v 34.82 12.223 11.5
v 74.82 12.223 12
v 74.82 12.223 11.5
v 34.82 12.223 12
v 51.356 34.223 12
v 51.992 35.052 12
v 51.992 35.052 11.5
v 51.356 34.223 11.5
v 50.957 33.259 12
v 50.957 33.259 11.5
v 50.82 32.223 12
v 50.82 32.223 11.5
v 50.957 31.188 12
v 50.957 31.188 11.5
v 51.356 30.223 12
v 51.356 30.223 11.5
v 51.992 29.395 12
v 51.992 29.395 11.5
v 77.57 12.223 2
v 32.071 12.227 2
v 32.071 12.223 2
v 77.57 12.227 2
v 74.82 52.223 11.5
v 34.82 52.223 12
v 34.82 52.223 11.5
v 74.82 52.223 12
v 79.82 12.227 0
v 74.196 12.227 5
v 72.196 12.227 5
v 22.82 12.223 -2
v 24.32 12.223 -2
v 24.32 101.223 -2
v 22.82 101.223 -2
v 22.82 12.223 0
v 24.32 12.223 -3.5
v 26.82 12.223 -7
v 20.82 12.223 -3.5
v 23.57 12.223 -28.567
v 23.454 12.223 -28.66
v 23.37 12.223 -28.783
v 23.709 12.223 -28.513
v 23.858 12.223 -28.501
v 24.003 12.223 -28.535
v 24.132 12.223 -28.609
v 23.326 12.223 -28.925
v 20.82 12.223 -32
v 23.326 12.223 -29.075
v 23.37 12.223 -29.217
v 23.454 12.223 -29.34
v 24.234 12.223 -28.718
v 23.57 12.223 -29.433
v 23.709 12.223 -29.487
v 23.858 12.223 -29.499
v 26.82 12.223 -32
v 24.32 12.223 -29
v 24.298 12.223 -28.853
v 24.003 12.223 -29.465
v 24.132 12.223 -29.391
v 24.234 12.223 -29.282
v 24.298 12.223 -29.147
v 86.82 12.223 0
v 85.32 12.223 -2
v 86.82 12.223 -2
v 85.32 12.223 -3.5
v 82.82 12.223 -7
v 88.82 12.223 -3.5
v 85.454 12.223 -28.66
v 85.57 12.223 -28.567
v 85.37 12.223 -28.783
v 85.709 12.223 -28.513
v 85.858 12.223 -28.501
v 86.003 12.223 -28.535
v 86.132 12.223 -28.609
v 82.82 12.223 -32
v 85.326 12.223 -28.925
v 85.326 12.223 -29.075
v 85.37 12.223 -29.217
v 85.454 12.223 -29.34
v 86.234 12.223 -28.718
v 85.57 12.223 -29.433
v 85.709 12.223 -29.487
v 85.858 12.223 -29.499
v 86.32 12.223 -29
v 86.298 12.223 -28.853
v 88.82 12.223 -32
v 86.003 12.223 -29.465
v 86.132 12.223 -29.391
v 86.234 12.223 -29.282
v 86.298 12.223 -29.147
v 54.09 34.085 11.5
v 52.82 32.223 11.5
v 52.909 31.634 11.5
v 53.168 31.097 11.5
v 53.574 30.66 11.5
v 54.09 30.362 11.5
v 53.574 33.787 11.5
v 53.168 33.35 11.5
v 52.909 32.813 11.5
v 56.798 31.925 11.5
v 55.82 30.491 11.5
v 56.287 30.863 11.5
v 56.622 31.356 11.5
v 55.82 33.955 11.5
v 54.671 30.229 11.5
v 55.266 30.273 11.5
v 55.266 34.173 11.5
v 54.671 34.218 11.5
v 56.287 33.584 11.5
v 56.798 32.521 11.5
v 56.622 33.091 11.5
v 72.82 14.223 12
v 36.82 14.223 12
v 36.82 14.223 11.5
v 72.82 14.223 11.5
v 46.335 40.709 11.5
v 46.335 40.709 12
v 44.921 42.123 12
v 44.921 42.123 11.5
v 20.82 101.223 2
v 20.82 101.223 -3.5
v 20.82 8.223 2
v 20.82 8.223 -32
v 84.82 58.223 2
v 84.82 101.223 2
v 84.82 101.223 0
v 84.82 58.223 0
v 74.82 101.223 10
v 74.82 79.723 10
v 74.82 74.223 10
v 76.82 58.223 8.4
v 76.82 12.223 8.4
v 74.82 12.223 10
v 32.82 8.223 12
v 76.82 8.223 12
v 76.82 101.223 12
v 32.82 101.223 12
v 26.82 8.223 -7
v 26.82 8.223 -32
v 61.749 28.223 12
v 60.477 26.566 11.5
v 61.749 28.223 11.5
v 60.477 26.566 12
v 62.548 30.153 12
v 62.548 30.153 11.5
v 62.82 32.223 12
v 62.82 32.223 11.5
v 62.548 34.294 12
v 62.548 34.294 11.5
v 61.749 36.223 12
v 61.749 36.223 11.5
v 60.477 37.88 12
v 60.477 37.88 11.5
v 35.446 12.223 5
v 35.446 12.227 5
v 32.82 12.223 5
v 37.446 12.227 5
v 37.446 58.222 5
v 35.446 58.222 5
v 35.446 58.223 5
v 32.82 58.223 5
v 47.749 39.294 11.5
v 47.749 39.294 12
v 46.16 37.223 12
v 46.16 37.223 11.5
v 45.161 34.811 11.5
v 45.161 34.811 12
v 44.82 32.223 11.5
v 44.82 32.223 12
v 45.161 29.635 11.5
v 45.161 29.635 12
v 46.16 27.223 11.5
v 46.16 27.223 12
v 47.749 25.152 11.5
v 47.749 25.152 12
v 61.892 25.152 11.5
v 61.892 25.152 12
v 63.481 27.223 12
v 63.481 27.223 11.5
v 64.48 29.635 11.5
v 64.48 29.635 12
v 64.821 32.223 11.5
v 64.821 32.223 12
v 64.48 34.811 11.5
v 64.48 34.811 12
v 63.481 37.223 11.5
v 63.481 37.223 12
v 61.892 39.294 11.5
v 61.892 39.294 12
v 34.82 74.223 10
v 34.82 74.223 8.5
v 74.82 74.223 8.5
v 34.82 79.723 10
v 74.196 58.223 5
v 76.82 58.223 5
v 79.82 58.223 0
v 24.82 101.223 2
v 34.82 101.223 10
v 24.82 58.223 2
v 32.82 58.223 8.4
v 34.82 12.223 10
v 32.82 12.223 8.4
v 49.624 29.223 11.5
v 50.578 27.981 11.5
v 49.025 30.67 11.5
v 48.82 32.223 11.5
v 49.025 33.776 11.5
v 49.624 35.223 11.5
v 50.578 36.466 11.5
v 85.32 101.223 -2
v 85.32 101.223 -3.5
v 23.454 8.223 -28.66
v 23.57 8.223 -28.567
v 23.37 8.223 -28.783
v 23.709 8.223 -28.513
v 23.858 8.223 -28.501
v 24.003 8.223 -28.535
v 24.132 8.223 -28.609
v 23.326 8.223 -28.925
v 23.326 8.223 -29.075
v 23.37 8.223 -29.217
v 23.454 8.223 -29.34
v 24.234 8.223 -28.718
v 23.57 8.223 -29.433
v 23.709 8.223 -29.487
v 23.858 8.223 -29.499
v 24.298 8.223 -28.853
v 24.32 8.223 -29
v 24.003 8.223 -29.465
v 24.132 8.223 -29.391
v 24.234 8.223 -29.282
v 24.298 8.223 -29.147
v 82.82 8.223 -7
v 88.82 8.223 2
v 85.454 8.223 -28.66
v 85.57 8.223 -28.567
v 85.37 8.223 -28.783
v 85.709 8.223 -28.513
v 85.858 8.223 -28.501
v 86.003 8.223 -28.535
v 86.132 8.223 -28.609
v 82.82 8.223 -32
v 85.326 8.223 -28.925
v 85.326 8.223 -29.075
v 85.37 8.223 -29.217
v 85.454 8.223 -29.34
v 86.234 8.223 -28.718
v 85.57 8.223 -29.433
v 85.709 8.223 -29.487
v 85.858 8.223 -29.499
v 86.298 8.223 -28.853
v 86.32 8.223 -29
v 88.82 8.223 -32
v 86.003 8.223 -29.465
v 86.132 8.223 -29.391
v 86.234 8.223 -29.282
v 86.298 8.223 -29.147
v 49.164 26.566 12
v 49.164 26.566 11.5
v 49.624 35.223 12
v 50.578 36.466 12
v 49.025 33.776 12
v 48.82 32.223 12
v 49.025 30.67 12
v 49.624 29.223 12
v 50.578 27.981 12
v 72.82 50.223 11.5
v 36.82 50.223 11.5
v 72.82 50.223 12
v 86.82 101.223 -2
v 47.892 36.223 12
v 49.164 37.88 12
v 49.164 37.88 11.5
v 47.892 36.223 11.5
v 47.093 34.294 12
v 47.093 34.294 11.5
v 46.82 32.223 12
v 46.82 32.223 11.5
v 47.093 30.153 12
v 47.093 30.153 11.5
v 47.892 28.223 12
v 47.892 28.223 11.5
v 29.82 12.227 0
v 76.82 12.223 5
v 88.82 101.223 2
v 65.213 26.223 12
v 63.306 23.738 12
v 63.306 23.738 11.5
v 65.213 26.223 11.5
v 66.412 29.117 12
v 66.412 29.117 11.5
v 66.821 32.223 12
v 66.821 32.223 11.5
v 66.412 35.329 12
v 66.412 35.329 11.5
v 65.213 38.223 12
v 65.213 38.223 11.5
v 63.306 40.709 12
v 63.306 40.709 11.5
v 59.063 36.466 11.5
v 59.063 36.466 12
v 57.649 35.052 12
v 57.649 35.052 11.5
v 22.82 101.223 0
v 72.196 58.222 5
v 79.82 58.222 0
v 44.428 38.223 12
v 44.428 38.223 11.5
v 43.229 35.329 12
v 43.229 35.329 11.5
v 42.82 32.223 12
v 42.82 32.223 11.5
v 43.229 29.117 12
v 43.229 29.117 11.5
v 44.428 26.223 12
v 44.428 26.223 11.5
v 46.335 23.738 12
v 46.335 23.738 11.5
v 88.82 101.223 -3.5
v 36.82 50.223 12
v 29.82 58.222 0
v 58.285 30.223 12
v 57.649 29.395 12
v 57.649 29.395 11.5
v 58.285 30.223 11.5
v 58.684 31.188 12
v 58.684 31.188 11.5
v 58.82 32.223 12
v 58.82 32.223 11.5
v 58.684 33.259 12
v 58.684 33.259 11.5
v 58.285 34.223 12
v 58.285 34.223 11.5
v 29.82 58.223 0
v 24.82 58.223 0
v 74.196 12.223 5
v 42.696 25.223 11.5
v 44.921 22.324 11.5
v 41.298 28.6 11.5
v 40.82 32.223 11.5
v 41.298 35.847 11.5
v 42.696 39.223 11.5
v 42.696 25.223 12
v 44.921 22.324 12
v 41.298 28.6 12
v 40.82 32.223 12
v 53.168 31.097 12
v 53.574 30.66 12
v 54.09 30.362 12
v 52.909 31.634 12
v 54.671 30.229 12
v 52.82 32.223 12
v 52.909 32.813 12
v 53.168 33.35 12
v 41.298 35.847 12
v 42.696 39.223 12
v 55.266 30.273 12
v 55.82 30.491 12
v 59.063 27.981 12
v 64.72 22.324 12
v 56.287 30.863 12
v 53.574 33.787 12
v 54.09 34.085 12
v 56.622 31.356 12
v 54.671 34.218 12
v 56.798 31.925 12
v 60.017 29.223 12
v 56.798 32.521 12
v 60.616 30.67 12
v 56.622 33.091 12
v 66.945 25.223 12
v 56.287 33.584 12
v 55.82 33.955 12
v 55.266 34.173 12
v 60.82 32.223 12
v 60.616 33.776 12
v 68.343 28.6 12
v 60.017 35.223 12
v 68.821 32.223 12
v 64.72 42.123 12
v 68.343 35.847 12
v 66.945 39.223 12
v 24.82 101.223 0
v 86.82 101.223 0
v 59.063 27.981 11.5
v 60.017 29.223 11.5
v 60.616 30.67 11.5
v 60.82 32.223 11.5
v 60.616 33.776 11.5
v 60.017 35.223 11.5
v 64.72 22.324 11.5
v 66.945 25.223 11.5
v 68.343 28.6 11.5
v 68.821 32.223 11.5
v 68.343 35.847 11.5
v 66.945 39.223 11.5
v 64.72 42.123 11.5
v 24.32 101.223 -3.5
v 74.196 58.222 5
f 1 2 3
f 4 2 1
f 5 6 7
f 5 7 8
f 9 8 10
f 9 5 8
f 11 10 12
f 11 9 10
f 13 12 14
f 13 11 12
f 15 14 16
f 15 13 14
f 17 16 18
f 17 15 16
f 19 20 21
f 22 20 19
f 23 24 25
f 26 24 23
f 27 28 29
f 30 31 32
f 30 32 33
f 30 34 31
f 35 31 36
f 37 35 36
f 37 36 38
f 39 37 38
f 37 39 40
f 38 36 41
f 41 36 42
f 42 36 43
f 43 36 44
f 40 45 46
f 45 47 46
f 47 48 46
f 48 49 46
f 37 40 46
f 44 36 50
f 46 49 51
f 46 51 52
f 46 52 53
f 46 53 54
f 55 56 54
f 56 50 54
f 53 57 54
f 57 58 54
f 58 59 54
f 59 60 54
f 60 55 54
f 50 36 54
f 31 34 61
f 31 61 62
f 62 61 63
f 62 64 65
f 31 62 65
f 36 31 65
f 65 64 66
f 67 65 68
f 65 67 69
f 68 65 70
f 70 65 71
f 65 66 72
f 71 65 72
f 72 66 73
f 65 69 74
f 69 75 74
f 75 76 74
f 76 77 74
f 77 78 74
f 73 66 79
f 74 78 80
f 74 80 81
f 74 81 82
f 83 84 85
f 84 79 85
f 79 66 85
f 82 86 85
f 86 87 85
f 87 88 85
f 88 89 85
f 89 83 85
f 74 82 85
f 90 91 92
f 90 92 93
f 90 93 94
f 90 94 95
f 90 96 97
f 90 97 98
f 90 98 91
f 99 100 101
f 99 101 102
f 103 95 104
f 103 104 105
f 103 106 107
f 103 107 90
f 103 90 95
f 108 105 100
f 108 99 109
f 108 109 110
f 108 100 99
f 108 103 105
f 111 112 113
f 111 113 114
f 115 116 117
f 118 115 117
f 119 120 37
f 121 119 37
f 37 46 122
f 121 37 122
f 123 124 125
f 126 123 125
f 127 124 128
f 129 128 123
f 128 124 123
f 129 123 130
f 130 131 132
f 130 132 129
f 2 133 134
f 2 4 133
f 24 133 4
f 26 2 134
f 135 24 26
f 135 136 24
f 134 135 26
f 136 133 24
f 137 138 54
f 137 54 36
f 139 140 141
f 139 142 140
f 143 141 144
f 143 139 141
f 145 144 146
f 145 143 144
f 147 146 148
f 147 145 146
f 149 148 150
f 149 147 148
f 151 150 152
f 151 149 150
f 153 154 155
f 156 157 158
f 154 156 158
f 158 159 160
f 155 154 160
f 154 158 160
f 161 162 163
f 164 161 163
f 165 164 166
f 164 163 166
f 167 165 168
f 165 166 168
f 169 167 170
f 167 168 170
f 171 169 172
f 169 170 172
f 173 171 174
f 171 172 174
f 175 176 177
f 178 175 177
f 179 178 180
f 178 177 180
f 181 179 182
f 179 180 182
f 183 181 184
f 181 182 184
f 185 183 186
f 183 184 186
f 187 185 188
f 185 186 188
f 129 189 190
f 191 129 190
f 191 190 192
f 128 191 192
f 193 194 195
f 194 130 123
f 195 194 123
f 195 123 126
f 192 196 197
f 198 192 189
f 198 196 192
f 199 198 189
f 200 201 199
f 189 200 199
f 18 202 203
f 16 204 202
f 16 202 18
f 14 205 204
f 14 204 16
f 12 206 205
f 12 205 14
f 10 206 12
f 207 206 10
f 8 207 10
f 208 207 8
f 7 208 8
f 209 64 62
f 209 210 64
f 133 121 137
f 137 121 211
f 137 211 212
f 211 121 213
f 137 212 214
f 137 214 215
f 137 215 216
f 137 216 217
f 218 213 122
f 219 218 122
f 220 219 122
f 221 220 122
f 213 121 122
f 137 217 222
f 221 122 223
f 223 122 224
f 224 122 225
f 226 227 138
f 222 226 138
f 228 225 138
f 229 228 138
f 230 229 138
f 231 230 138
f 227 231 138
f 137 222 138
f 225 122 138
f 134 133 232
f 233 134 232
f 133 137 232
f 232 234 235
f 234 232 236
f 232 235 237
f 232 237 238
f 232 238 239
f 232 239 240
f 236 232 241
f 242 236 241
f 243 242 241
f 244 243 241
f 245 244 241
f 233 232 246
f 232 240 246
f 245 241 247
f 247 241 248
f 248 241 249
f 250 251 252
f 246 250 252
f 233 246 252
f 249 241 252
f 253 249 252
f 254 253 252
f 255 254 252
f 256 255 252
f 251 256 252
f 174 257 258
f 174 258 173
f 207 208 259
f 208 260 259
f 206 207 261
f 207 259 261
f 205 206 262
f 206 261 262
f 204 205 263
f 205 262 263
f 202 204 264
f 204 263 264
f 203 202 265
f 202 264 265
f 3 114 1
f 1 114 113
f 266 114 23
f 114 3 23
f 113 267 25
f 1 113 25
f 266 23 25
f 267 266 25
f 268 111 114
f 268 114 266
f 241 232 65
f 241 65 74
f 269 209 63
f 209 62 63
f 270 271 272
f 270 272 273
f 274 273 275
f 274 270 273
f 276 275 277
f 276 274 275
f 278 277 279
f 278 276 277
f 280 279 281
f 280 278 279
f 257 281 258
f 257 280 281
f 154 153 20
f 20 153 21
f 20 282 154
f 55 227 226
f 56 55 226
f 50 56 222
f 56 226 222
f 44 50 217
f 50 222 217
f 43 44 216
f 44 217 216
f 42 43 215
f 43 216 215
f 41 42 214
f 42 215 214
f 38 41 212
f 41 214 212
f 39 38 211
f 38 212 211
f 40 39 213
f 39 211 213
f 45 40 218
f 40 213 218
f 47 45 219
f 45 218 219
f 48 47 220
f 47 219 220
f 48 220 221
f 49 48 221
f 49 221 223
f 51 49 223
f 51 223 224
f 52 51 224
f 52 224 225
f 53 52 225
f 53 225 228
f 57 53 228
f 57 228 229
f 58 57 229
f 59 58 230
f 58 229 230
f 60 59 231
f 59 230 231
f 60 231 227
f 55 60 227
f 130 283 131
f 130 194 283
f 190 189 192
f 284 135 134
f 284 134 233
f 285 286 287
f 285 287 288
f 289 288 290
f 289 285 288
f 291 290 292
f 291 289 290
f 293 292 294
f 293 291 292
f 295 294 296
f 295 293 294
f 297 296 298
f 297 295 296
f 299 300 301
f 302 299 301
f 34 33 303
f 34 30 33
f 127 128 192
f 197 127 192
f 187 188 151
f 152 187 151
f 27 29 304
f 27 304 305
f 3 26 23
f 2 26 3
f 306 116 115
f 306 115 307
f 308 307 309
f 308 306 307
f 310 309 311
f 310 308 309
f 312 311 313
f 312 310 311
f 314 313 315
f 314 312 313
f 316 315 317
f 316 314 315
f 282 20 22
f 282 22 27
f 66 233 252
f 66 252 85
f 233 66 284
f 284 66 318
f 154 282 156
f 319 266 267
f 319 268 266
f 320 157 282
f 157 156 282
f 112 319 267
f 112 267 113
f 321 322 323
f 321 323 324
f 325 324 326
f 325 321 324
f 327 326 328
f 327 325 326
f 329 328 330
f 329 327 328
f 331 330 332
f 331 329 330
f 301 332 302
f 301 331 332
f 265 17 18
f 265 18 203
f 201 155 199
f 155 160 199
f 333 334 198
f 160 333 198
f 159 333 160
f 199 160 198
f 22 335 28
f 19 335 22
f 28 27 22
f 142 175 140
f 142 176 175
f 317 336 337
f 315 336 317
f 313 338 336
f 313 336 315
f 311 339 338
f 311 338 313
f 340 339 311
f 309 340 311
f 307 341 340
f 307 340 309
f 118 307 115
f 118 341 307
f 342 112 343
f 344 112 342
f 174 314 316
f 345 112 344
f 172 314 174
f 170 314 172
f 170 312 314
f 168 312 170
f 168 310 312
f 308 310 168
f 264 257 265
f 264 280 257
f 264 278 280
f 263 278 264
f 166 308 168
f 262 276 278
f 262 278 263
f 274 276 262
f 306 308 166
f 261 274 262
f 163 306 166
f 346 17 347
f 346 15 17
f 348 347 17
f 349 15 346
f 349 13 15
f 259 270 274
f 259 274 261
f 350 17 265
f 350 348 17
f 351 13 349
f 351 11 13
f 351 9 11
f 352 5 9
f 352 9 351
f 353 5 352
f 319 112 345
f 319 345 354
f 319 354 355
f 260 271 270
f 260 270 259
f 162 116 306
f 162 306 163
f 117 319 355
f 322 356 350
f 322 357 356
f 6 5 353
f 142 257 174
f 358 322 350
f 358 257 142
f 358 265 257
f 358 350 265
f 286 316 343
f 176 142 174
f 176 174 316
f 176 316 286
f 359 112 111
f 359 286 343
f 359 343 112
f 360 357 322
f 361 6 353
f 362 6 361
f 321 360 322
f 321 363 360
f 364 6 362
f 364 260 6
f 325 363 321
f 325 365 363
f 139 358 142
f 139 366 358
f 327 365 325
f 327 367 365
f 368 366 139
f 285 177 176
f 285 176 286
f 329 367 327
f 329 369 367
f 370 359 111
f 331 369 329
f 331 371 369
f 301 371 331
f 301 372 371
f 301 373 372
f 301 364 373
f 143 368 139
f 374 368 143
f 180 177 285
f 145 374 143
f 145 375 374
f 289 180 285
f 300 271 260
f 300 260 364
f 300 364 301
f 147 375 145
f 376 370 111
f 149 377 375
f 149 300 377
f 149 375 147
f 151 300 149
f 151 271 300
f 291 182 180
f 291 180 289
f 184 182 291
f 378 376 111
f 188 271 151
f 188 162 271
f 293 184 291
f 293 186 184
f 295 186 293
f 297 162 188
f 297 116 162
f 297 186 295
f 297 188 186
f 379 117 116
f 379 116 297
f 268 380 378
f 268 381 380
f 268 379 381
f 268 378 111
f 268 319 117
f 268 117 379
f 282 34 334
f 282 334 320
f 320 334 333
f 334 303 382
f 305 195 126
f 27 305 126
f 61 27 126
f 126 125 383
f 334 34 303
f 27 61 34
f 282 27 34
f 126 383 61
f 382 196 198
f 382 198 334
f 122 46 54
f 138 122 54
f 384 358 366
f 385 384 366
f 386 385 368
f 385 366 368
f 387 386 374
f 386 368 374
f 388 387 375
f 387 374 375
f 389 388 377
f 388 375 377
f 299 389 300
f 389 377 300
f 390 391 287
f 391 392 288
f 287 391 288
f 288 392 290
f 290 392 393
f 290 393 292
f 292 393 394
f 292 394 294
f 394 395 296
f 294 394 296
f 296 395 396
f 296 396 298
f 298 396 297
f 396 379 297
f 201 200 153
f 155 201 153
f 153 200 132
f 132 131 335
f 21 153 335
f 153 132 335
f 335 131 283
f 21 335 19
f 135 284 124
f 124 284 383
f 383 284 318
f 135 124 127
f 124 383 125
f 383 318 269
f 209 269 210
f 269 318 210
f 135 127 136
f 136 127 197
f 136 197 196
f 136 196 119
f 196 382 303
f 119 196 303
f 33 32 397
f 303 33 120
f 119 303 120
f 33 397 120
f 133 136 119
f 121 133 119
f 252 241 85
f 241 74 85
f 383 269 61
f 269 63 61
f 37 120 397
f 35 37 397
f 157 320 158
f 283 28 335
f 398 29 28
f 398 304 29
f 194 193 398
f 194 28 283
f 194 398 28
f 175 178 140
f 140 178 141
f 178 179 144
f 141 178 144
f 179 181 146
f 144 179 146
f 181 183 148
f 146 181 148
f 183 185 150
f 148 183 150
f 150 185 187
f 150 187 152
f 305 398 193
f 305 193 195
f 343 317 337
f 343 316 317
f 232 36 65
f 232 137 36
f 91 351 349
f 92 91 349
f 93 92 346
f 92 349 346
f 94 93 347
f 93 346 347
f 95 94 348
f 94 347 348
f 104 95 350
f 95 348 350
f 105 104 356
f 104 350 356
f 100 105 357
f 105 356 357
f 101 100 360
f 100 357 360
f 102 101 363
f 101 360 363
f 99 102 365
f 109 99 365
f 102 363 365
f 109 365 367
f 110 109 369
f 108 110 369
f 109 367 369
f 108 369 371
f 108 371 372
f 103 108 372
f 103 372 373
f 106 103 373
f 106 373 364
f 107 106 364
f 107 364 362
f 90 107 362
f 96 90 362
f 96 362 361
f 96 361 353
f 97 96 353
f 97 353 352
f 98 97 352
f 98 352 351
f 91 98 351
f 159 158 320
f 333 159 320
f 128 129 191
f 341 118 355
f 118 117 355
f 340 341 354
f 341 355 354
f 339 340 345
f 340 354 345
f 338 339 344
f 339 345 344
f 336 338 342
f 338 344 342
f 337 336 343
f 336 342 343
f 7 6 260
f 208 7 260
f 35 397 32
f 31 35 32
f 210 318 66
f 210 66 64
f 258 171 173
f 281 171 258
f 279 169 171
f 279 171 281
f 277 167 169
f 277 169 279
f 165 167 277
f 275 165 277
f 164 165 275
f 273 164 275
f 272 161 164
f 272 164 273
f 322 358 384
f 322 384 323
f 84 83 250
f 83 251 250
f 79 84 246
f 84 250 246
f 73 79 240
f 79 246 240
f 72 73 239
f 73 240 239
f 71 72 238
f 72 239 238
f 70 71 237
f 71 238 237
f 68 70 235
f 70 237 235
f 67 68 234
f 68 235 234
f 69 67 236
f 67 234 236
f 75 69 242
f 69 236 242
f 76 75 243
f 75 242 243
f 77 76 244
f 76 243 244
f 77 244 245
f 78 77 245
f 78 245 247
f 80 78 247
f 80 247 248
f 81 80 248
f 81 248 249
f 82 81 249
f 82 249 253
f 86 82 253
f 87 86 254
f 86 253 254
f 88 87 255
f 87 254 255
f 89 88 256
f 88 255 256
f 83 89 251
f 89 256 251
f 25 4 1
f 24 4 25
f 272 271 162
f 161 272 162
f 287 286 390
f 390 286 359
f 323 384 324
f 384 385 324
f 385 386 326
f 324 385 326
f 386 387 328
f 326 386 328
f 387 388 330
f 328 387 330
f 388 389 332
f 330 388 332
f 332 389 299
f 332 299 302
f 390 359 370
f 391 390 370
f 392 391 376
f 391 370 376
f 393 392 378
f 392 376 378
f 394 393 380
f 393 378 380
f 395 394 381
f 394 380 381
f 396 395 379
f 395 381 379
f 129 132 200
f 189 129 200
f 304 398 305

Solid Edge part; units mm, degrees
sketch "Sketch1" plane through (0, 0, 0) normal (0, 0, 1) x (1, 0, 0)
  line L0 (20.8205, 8.2233) -> (88.8205, 8.2233)
  line L1 (88.8205, 8.2233) -> (88.8205, 101.2233)
  line L2 (88.8205, 101.2233) -> (20.8205, 101.2233)
  line L3 (20.8205, 101.2233) -> (20.8205, 8.2233)
extrude "Protrusion1" add sketch "Sketch1" along normal blind 2
sketch "Sketch2" plane through (54.8205, 54.7233, 0) normal (0, 0, -1) x (1, 0, 0)
  line L0 (-34, 46.5) -> (34, 46.5)
  line L1 (34, 46.5) -> (34, 42.5)
  line L2 (34, 42.5) -> (-34, 42.5)
  line L3 (-34, 42.5) -> (-34, 46.5)
extrude "Extrusionsausprägung_2" add sketch "Sketch2" along normal blind 32
sketch "Sketch3" plane through (54.8205, 12.2233, -16) normal (0, 1, 0) x (-1, 0, 0)
  line L0 (-34, 16) -> (-34, 12)
  line L1 (-34, 12) -> (-30, 12)
  line L2 (-30, 12) -> (-30, 14)
  line L3 (-30, 14) -> (-32, 14)
  line L4 (-32, 14) -> (-32, 16)
  line L5 (-32, 16) -> (-34, 16)
  line L6 (34, 12) -> (30, 12)
  line L7 (30, 12) -> (30, 14)
  line L8 (30, 14) -> (32, 14)
  line L9 (32, 14) -> (32, 16)
  line L10 (32, 16) -> (34, 16)
  line L11 (34, 16) -> (34, 12)
extrude "Extrusionsausprägung_3" add sketch "Sketch3" along normal blind 89
sketch "Sketch4" plane through (54.8205, 54.7233, 2) normal (0, 0, 1) x (-1, 0, 0)
  line L0 (34, 46.5) -> (-34, 46.5)
  line L1 (-34, 46.5) -> (-34, 42.5)
  line L2 (-34, 42.5) -> (34, 42.5)
  line L3 (34, 42.5) -> (34, 46.5)
extrude "Extrusionsausprägung_4" add sketch "Sketch4" along normal blind 10
sketch "Sketch5" plane through (54.8205, 12.2233, 7) normal (0, 1, 0) x (-1, 0, 0)
  line L0 (-22, 5) -> (-34, -5)
  line L1 (-34, -5) -> (-30, -5)
  line L2 (-30, -5) -> (-20, 3)
  line L3 (-20, 3) -> (20, 3)
  line L4 (30, -5) -> (20, 3)
  line L5 (34, -5) -> (30, -5)
  line L6 (22, 5) -> (34, -5)
  line L7 (22, 5) -> (20, 5)
  line L8 (20, 5) -> (-20, 5)
  line L9 (-22, 5) -> (-20, 5)
extrude "Protrusion2" add sketch "Sketch5" along normal up to vertex (89 mm away)
sketch "Sketch6" plane through (26.8205, 12.2233, 7) normal (0, 1, 0) x (-1, 0, 0)
  line L0 (6, 5) -> (-6, 5)
  line L1 (-6, 5) -> (6, -5)
  line L2 (6, 5) -> (6, -5)
  line L3 (-62, -5) -> (-62, 5)
  line L4 (-62, 5) -> (-50, 5)
  line L5 (-50, 5) -> (-62, -5)
extrude "Extrusionsausschnitt_1" cut sketch "Sketch6" against normal blind 15.0999
sketch "Sketch7" plane through (54.8205, 101.2233, 4) normal (0, 1, 0) x (-1, 0, 0)
  line L0 (30, -2) -> (30, -4)
  line L1 (-30, -4) -> (30, -4)
  line L2 (-30, -2) -> (-30, -4)
  line L3 (30, -2) -> (-30, -2)
extrude "Extrusionsausschnitt_2" cut sketch "Sketch7" against normal blind 88.9965
sketch "Sketch8" plane through (54.8205, 12.2233, 6) normal (0, 1, 0) x (-1, 0, 0)
  line L0 (20, 4) -> (20, 2)
  line L1 (20, 2) -> (16, 2)
  line L2 (16, 2) -> (25, -6)
  line L3 (25, -6) -> (30, -6)
  line L4 (30, -6) -> (30, -4)
  line L5 (30, -4) -> (20, 4)
  line L6 (-20, 4) -> (-20, 2)
  line L7 (-20, 2) -> (-16, 2)
  line L8 (-16, 2) -> (-25, -6)
  line L9 (-25, -6) -> (-30, -6)
  line L10 (-30, -6) -> (-30, -4)
  line L11 (-30, -4) -> (-20, 4)
extrude "Extrusionsausprägung_6" add sketch "Sketch8" along normal blind 46
sketch "Sketch9" plane through (34.8205, 35.2233, 9) normal (1, 0, 0) x (0, -1, 0)
  line L0 (-39, -1) -> (-44.5, -1)
  line L1 (-39, 0.5) -> (-44.5, -1)
  line L2 (-39, -1) -> (-39, 0.5)
extrude "Protrusion3" add sketch "Sketch9" along normal up to vertex (40 mm away)
sketch "Sketch10" plane through (20.8205, 54.7233, -15) normal (-1, 0, 0) x (0, -1, 0)
  line L0 (42.5, -17) -> (42.5, -13)
  line L1 (42.5, -13) -> (46.5, -13)
  line L2 (46.5, -13) -> (46.5, -17)
  line L3 (46.5, -17) -> (42.5, -17)
extrude "Extrusionsausschnitt_3" cut sketch "Sketch10" against normal blind 105.6963
sketch "Sketch11" plane through (54.8205, 8.2233, -8) normal (0, -1, 0) x (1, 0, 0)
  line L0 (-28, -20) -> (-28, -4)
  line L1 (28, -4) -> (-28, -4)
  line L2 (28, -20) -> (28, -4)
  line L3 (-28, -20) -> (28, -20)
extrude "Extrusionsausschnitt_4" cut sketch "Sketch11" against normal blind 79.8012
sketch "Sketch12" plane through (54.8205, 54.7233, 12) normal (0, 0, 1) x (-1, 0, 0)
  line L0 (20, 42.5) -> (20, 2.5)
  line L1 (20, 2.5) -> (-20, 2.5)
  line L2 (-20, 2.5) -> (-20, 42.5)
  line L3 (-20, 42.5) -> (20, 42.5)
  line L4 (-18, 40.5) -> (-18, 4.5)
  line L5 (-18, 4.5) -> (18, 4.5)
  line L6 (18, 4.5) -> (18, 40.5)
  line L7 (18, 40.5) -> (-18, 40.5)
extrude "Extrusionsausschnitt_5" cut sketch "Sketch12" against normal blind 0.5
sketch "Sketch13" plane through (54.8205, 12.2233, -14) normal (0, 1, 0) x (-1, 0, 0)
  line L0 (34, -18) -> (28, -18)
  line L1 (28, -18) -> (28, -14)
  line L2 (28, -14) -> (34, -14)
  line L3 (34, -14) -> (34, -18)
  line L4 (-28, -14) -> (-28, -18)
  line L5 (-28, -18) -> (-34, -18)
  line L6 (-34, -18) -> (-34, -14)
  line L7 (-34, -14) -> (-28, -14)
extrude "Protrusion4" add sketch "Sketch13" against normal blind 4
sketch "Sketch14" plane through (54.8205, 8.2233, -10) normal (0, -1, 0) x (1, 0, 0)
  circle A0 centre (-31, -19) radius 0.5
  circle A1 centre (31, -19) radius 0.5
extrude "Extrusionsausschnitt_6" cut sketch "Sketch14" against normal blind 44.3708
sketch "Sketch15" plane through (54.8205, 8.2233, -10) normal (0, -1, 0) x (1, 0, 0)
  line L0 (-28, -2) -> (-28, 3)
  line L1 (-28, 3) -> (28, 3)
  line L2 (28, 3) -> (28, -2)
  line L3 (28, -2) -> (-28, -2)
extrude "Extrusionsausschnitt_7" cut sketch "Sketch15" against normal blind 62.3591
sketch "Sketch16" plane through (31.8205, 58.2233, 5) normal (0, 1, 0) x (-1, 0, 0)
  line L0 (-7, 3) -> (-7, 0)
  line L1 (-7, 0) -> (-1, 0)
  line L2 (-1, 0) -> (-1, 3.4)
  line L3 (-1, 3.4) -> (-3, 5)
  line L4 (-3, 5) -> (-7, 5)
  line L5 (-7, 5) -> (-7, 3)
  line L6 (-39, 0) -> (-45, 0)
  line L7 (-45, 0) -> (-45, 3.4)
  line L8 (-45, 3.4) -> (-43, 5)
  line L9 (-43, 5) -> (-39, 5)
  line L10 (-39, 5) -> (-39, 0)
extrude "Cutout1" cut sketch "Sketch16" against normal up to vertex (46 mm away)
sketch "Sketch17" plane through (54.8205, 12.2269, 1) normal (0, 1, 0) x (1, 0, 0)
  line L0 (19.375, -4) -> (17.375, -4)
  line L1 (17.375, -4) -> (25, 1)
  line L2 (25, 1) -> (19.375, -4)
  line L3 (-19.375, -4) -> (-17.375, -4)
  line L4 (-17.375, -4) -> (-25, 1)
  line L5 (-25, 1) -> (-19.375, -4)
extrude "Protrusion5" add sketch "Sketch17" along normal blind 45.9956
sketch "Sketch18" plane through (54.8205, 101.2233, 4) normal (0, 1, 0) x (1, 0, 0)
  line L0 (-30, 6) -> (-30.5, 6)
  line L1 (-30.5, 7.5) -> (-30.5, 6)
  line L2 (-34, 7.5) -> (-30.5, 7.5)
  line L3 (-34, 8) -> (-34, 7.5)
  line L4 (-34, 8) -> (-30, 8)
  line L5 (-30, 6) -> (-30, 8)
  line L6 (34, 7.5) -> (30.5, 7.5)
  line L7 (30.5, 7.5) -> (30.5, 6)
  line L8 (30.5, 6) -> (30, 6)
  line L9 (30, 6) -> (30, 8)
  line L10 (30, 8) -> (34, 8)
  line L11 (34, 8) -> (34, 7.5)
extrude "Cutout2" cut sketch "Sketch18" against normal up to vertex (89 mm away)
sketch "Sketch19" plane through (54.8205, 32.2233, 12) normal (0, 0, 1) x (-1, 0, 0)
  circle A0 centre (0, 0) radius 2
  arc A1 (2.8284, 2.8284) -> (2.8284, -2.8284) centre (0, 0) cw
  line L0 (2.8284, -2.8284) -> (4.2426, -4.2426)
  arc A2 (4.2426, 4.2426) -> (4.2426, -4.2426) centre (0, 0) cw
  line L1 (2.8284, 2.8284) -> (4.2426, 4.2426)
  arc A3 (5.6569, 5.6569) -> (5.6569, -5.6569) centre (0, 0) cw
  line L2 (5.6569, -5.6569) -> (7.0711, -7.0711)
  arc A4 (7.0711, 7.0711) -> (7.0711, -7.0711) centre (0, 0) cw
  line L3 (5.6569, 5.6569) -> (7.0711, 7.0711)
  arc A5 (8.4853, 8.4853) -> (8.4853, -8.4853) centre (0, 0) cw
  line L4 (8.4853, -8.4853) -> (9.8995, -9.8995)
  arc A6 (9.8995, 9.8995) -> (9.8995, -9.8995) centre (0, 0) cw
  line L5 (8.4853, 8.4853) -> (9.8995, 9.8995)
  arc A7 (-2.8284, 2.8284) -> (-2.8284, -2.8284) centre (0, 0) ccw
  line L6 (-4.2426, -4.2426) -> (-2.8284, -2.8284)
  arc A8 (-4.2426, 4.2426) -> (-4.2426, -4.2426) centre (0, 0) ccw
  line L7 (-4.2426, 4.2426) -> (-2.8284, 2.8284)
  arc A9 (-5.6569, 5.6569) -> (-5.6569, -5.6569) centre (0, 0) ccw
  line L8 (-7.0711, -7.0711) -> (-5.6569, -5.6569)
  arc A10 (-7.0711, 7.0711) -> (-7.0711, -7.0711) centre (0, 0) ccw
  line L9 (-7.0711, 7.0711) -> (-5.6569, 5.6569)
  arc A11 (-8.4853, 8.4853) -> (-8.4853, -8.4853) centre (0, 0) ccw
  line L10 (-9.8995, -9.8995) -> (-8.4853, -8.4853)
  arc A12 (-9.8995, 9.8995) -> (-9.8995, -9.8995) centre (0, 0) ccw
  line L11 (-8.4853, 8.4853) -> (-9.8995, 9.8995)
extrude "Cutout3" cut sketch "Sketch19" against normal up to vertex (0.5 mm away)
